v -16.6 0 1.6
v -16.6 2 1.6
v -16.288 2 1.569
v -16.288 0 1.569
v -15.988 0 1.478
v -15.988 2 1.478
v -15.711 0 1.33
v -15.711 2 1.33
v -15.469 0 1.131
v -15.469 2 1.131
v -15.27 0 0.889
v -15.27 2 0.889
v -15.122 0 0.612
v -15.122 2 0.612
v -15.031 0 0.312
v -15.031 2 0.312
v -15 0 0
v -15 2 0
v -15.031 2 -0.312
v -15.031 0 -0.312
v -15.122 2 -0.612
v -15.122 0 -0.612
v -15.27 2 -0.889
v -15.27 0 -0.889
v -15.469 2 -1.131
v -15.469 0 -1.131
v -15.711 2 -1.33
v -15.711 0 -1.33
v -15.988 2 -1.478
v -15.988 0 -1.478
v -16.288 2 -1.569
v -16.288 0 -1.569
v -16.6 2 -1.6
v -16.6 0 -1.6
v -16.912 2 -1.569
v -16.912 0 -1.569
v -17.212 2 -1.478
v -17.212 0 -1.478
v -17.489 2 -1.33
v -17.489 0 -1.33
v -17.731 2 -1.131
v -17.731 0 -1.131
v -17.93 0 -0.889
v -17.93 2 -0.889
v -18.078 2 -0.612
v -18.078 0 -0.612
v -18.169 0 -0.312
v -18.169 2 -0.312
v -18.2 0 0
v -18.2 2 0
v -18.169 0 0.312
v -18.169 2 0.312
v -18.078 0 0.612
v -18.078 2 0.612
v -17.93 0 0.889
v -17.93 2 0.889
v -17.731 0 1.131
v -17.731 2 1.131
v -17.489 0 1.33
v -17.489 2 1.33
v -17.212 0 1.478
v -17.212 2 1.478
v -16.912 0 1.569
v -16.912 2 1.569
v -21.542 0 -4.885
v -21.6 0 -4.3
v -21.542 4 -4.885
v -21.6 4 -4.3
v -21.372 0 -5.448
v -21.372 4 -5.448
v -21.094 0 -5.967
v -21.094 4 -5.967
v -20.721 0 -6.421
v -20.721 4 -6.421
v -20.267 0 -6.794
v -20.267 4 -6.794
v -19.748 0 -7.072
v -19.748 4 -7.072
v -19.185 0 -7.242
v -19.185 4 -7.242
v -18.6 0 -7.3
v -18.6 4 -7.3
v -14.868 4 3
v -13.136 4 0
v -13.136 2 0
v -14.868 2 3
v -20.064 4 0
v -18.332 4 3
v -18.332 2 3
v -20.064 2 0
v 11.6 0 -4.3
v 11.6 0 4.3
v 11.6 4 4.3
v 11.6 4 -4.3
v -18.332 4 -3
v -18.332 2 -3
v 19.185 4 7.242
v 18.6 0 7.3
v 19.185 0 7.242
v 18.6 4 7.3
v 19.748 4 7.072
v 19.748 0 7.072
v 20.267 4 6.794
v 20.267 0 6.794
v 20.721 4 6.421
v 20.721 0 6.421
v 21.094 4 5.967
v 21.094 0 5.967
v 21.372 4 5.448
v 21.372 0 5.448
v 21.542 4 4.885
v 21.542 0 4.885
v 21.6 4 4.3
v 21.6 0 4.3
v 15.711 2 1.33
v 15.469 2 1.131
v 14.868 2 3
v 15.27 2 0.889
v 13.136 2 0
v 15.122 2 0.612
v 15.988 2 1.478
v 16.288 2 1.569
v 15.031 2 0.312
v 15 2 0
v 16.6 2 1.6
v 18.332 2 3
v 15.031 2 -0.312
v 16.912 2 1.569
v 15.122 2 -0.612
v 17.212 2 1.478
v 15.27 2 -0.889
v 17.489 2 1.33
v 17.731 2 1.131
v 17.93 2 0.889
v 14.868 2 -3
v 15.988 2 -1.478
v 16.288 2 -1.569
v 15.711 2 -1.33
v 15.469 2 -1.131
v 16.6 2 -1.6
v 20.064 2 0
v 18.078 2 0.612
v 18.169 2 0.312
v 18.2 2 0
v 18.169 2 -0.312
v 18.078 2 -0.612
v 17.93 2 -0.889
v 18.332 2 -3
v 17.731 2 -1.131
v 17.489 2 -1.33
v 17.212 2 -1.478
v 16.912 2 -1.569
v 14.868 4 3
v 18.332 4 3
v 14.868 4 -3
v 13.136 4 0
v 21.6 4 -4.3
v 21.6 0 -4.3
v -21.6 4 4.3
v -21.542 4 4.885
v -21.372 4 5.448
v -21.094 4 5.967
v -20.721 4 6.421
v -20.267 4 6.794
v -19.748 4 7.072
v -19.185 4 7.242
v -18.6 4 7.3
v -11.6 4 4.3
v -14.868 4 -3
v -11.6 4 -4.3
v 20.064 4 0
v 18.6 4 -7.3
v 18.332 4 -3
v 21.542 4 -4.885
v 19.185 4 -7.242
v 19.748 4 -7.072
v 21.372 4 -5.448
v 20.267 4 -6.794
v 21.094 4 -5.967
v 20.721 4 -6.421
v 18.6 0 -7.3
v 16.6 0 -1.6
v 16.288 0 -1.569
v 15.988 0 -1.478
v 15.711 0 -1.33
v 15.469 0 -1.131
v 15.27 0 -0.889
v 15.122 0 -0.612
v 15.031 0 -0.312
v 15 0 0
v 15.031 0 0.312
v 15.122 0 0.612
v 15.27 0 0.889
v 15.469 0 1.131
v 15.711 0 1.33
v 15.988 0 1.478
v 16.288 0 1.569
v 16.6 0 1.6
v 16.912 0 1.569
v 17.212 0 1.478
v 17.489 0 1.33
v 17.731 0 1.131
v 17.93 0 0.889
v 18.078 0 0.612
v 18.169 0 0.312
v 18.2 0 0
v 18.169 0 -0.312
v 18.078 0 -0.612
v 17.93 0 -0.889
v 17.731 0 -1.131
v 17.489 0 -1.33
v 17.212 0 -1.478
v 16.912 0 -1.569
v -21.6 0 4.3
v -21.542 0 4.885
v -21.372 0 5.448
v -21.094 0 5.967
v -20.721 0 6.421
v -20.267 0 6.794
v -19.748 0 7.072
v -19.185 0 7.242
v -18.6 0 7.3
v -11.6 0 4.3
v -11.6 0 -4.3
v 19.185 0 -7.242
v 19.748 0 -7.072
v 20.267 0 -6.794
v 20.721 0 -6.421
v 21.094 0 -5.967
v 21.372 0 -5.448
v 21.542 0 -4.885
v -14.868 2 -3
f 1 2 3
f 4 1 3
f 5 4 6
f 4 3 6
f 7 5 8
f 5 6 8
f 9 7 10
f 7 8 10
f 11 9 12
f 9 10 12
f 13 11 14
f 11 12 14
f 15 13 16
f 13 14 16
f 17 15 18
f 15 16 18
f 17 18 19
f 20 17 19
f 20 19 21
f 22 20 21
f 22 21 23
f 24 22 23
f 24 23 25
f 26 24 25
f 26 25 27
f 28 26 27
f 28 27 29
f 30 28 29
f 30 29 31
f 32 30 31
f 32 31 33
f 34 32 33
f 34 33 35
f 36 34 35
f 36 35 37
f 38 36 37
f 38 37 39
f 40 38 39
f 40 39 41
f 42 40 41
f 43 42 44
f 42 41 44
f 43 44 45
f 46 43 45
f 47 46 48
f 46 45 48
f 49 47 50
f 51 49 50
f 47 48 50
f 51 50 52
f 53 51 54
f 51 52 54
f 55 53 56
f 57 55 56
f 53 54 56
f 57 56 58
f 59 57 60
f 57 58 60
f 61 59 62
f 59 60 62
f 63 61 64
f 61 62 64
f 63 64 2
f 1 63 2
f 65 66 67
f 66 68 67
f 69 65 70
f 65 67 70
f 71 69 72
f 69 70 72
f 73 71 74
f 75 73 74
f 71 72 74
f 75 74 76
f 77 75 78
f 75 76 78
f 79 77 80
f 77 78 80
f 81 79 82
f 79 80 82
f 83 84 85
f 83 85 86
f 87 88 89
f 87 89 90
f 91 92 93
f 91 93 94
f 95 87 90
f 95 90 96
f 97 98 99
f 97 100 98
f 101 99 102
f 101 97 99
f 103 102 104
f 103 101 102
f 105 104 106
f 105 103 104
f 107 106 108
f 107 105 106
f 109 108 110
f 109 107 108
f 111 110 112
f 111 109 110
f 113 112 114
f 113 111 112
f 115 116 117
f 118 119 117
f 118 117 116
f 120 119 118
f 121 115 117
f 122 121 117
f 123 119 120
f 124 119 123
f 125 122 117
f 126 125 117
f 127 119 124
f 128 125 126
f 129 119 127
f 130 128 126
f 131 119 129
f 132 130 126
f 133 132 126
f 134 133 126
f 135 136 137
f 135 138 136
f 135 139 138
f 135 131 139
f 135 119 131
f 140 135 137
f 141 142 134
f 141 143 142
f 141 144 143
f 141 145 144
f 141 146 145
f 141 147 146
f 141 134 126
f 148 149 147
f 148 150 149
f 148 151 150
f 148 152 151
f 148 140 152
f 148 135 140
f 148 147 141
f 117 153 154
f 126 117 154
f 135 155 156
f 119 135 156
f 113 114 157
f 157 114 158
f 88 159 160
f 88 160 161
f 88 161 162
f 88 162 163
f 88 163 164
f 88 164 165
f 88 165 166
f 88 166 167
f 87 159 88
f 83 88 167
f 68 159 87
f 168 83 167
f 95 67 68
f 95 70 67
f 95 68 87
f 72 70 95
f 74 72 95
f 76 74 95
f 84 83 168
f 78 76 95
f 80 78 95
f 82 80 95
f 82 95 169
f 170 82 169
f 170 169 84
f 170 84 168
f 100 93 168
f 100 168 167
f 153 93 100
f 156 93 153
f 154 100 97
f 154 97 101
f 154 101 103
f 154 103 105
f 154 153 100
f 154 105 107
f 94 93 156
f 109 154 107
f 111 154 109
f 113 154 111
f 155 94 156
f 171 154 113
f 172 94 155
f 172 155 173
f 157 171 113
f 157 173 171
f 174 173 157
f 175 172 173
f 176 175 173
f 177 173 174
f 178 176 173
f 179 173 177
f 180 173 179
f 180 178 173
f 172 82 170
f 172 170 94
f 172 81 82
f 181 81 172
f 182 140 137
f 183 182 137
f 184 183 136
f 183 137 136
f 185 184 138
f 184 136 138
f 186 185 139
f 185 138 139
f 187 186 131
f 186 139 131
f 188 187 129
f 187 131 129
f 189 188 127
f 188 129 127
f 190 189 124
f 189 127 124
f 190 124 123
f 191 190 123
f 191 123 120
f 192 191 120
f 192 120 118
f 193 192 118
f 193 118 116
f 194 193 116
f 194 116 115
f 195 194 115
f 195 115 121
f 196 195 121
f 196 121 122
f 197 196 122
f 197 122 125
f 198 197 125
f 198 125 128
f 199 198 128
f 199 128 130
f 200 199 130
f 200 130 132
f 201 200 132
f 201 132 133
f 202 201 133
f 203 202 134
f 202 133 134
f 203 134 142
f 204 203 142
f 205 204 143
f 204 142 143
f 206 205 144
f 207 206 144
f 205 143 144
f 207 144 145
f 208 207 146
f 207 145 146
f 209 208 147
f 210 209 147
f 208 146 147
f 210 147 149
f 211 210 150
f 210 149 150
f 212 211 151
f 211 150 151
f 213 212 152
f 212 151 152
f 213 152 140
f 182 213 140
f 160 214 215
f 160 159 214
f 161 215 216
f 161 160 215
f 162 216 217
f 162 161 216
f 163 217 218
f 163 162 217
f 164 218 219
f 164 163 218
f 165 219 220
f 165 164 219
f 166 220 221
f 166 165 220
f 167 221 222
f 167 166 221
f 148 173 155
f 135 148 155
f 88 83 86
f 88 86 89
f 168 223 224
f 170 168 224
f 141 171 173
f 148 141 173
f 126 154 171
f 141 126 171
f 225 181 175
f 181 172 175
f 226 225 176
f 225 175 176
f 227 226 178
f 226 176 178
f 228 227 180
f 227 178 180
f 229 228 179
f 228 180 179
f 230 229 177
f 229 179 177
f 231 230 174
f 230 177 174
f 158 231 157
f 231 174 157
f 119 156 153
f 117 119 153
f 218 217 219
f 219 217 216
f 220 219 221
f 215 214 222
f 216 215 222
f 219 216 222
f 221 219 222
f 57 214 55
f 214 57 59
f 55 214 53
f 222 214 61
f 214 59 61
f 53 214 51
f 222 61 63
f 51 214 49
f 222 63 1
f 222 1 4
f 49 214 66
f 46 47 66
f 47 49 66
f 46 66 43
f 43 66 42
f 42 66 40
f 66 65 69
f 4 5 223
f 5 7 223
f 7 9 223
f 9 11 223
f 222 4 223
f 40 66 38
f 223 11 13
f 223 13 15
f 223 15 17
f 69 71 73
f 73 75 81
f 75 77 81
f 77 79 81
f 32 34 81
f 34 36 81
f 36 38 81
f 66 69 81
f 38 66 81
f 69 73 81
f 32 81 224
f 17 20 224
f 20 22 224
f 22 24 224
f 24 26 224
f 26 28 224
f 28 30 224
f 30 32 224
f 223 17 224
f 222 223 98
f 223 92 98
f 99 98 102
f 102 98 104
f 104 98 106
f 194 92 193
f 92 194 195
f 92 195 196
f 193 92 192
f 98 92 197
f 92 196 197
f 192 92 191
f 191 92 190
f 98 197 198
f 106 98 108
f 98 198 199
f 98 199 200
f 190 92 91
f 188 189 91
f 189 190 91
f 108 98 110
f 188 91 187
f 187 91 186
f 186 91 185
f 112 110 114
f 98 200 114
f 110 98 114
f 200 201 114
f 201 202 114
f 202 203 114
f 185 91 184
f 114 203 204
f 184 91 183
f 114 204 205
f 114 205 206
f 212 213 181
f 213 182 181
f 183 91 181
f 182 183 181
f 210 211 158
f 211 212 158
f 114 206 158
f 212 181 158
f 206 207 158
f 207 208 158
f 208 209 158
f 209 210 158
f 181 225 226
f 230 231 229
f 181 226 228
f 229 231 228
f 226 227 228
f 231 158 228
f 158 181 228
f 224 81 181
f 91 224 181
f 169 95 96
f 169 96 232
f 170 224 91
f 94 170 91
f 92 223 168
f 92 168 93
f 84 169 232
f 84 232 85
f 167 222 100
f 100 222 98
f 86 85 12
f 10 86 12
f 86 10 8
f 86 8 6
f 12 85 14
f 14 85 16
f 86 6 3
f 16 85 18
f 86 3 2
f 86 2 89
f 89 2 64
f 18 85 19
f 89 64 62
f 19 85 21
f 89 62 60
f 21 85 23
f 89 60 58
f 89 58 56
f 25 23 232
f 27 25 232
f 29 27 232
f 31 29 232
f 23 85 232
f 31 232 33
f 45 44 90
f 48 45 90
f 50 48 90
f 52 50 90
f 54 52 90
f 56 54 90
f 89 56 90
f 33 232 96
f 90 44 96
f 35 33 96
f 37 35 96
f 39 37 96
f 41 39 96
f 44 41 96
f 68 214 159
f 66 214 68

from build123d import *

# Parameters (mm, degrees)
SKETCH1_W           = 43.2
SKETCH1_H           = 14.6
SKETCH1_W_2         = 23.2
SKETCH1_H_2         = 8.6
BOSS_EXTRUDE1_DEPTH = 4
CUT_EXTRUDE1_DEPTH  = 2
SKETCH5_R           = 1.6
CUT_EXTRUDE2_DEPTH  = 23.88776966
FILLET2_R           = 3


with BuildPart() as part:
    # Sketch1 → Boss-Extrude1 (new body)
    with BuildSketch(Plane(origin=(0, 0, 0), x_dir=(1, 0, 0), z_dir=(0, 1, 0))):
        Rectangle(SKETCH1_W, SKETCH1_H)
        Rectangle(SKETCH1_W_2, SKETCH1_H_2, mode=Mode.SUBTRACT)
    extrude(amount=BOSS_EXTRUDE1_DEPTH)

    # Sketch4 → Cut-Extrude1 (cut)
    with BuildSketch(Plane(origin=(0, 4, 0), x_dir=(1, 0, 0), z_dir=(0, 1, 0))):
        Polygon((18.332050808, -3), (20.064101615, 0), (18.332050808, 3), (14.867949192, 3), (13.135898385, 0), (14.867949192, -3), align=None)
        Polygon((-14.867949192, -3), (-18.332050808, -3), (-20.064101615, 0), (-18.332050808, 3), (-14.867949192, 3), (-13.135898385, 0), align=None)
    extrude(amount=-CUT_EXTRUDE1_DEPTH, mode=Mode.SUBTRACT)

    # Sketch5 → Cut-Extrude2 (cut, through all)
    with BuildSketch(Plane(origin=(0, 2, 0), x_dir=(1, 0, 0), z_dir=(0, 1, 0))):
        with Locations(Location((-16.6, 0, 0), (0, 0, 270))):
            Circle(SKETCH5_R)
        with Locations(Location((16.6, 0, 0), (0, 0, 90))):
            Circle(SKETCH5_R)
    extrude(amount=-CUT_EXTRUDE2_DEPTH, mode=Mode.SUBTRACT)

    # Fillet2
    fillet2_edges = [part.edges().sort_by_distance(p)[0] for p in [
        (-21.6, 2, -7.3),
        (21.6, 2, -7.3),
        (21.6, 2, 7.3),
        (-21.6, 2, 7.3),
    ]]
    fillet(fillet2_edges, radius=FILLET2_R)


solid = part.part
